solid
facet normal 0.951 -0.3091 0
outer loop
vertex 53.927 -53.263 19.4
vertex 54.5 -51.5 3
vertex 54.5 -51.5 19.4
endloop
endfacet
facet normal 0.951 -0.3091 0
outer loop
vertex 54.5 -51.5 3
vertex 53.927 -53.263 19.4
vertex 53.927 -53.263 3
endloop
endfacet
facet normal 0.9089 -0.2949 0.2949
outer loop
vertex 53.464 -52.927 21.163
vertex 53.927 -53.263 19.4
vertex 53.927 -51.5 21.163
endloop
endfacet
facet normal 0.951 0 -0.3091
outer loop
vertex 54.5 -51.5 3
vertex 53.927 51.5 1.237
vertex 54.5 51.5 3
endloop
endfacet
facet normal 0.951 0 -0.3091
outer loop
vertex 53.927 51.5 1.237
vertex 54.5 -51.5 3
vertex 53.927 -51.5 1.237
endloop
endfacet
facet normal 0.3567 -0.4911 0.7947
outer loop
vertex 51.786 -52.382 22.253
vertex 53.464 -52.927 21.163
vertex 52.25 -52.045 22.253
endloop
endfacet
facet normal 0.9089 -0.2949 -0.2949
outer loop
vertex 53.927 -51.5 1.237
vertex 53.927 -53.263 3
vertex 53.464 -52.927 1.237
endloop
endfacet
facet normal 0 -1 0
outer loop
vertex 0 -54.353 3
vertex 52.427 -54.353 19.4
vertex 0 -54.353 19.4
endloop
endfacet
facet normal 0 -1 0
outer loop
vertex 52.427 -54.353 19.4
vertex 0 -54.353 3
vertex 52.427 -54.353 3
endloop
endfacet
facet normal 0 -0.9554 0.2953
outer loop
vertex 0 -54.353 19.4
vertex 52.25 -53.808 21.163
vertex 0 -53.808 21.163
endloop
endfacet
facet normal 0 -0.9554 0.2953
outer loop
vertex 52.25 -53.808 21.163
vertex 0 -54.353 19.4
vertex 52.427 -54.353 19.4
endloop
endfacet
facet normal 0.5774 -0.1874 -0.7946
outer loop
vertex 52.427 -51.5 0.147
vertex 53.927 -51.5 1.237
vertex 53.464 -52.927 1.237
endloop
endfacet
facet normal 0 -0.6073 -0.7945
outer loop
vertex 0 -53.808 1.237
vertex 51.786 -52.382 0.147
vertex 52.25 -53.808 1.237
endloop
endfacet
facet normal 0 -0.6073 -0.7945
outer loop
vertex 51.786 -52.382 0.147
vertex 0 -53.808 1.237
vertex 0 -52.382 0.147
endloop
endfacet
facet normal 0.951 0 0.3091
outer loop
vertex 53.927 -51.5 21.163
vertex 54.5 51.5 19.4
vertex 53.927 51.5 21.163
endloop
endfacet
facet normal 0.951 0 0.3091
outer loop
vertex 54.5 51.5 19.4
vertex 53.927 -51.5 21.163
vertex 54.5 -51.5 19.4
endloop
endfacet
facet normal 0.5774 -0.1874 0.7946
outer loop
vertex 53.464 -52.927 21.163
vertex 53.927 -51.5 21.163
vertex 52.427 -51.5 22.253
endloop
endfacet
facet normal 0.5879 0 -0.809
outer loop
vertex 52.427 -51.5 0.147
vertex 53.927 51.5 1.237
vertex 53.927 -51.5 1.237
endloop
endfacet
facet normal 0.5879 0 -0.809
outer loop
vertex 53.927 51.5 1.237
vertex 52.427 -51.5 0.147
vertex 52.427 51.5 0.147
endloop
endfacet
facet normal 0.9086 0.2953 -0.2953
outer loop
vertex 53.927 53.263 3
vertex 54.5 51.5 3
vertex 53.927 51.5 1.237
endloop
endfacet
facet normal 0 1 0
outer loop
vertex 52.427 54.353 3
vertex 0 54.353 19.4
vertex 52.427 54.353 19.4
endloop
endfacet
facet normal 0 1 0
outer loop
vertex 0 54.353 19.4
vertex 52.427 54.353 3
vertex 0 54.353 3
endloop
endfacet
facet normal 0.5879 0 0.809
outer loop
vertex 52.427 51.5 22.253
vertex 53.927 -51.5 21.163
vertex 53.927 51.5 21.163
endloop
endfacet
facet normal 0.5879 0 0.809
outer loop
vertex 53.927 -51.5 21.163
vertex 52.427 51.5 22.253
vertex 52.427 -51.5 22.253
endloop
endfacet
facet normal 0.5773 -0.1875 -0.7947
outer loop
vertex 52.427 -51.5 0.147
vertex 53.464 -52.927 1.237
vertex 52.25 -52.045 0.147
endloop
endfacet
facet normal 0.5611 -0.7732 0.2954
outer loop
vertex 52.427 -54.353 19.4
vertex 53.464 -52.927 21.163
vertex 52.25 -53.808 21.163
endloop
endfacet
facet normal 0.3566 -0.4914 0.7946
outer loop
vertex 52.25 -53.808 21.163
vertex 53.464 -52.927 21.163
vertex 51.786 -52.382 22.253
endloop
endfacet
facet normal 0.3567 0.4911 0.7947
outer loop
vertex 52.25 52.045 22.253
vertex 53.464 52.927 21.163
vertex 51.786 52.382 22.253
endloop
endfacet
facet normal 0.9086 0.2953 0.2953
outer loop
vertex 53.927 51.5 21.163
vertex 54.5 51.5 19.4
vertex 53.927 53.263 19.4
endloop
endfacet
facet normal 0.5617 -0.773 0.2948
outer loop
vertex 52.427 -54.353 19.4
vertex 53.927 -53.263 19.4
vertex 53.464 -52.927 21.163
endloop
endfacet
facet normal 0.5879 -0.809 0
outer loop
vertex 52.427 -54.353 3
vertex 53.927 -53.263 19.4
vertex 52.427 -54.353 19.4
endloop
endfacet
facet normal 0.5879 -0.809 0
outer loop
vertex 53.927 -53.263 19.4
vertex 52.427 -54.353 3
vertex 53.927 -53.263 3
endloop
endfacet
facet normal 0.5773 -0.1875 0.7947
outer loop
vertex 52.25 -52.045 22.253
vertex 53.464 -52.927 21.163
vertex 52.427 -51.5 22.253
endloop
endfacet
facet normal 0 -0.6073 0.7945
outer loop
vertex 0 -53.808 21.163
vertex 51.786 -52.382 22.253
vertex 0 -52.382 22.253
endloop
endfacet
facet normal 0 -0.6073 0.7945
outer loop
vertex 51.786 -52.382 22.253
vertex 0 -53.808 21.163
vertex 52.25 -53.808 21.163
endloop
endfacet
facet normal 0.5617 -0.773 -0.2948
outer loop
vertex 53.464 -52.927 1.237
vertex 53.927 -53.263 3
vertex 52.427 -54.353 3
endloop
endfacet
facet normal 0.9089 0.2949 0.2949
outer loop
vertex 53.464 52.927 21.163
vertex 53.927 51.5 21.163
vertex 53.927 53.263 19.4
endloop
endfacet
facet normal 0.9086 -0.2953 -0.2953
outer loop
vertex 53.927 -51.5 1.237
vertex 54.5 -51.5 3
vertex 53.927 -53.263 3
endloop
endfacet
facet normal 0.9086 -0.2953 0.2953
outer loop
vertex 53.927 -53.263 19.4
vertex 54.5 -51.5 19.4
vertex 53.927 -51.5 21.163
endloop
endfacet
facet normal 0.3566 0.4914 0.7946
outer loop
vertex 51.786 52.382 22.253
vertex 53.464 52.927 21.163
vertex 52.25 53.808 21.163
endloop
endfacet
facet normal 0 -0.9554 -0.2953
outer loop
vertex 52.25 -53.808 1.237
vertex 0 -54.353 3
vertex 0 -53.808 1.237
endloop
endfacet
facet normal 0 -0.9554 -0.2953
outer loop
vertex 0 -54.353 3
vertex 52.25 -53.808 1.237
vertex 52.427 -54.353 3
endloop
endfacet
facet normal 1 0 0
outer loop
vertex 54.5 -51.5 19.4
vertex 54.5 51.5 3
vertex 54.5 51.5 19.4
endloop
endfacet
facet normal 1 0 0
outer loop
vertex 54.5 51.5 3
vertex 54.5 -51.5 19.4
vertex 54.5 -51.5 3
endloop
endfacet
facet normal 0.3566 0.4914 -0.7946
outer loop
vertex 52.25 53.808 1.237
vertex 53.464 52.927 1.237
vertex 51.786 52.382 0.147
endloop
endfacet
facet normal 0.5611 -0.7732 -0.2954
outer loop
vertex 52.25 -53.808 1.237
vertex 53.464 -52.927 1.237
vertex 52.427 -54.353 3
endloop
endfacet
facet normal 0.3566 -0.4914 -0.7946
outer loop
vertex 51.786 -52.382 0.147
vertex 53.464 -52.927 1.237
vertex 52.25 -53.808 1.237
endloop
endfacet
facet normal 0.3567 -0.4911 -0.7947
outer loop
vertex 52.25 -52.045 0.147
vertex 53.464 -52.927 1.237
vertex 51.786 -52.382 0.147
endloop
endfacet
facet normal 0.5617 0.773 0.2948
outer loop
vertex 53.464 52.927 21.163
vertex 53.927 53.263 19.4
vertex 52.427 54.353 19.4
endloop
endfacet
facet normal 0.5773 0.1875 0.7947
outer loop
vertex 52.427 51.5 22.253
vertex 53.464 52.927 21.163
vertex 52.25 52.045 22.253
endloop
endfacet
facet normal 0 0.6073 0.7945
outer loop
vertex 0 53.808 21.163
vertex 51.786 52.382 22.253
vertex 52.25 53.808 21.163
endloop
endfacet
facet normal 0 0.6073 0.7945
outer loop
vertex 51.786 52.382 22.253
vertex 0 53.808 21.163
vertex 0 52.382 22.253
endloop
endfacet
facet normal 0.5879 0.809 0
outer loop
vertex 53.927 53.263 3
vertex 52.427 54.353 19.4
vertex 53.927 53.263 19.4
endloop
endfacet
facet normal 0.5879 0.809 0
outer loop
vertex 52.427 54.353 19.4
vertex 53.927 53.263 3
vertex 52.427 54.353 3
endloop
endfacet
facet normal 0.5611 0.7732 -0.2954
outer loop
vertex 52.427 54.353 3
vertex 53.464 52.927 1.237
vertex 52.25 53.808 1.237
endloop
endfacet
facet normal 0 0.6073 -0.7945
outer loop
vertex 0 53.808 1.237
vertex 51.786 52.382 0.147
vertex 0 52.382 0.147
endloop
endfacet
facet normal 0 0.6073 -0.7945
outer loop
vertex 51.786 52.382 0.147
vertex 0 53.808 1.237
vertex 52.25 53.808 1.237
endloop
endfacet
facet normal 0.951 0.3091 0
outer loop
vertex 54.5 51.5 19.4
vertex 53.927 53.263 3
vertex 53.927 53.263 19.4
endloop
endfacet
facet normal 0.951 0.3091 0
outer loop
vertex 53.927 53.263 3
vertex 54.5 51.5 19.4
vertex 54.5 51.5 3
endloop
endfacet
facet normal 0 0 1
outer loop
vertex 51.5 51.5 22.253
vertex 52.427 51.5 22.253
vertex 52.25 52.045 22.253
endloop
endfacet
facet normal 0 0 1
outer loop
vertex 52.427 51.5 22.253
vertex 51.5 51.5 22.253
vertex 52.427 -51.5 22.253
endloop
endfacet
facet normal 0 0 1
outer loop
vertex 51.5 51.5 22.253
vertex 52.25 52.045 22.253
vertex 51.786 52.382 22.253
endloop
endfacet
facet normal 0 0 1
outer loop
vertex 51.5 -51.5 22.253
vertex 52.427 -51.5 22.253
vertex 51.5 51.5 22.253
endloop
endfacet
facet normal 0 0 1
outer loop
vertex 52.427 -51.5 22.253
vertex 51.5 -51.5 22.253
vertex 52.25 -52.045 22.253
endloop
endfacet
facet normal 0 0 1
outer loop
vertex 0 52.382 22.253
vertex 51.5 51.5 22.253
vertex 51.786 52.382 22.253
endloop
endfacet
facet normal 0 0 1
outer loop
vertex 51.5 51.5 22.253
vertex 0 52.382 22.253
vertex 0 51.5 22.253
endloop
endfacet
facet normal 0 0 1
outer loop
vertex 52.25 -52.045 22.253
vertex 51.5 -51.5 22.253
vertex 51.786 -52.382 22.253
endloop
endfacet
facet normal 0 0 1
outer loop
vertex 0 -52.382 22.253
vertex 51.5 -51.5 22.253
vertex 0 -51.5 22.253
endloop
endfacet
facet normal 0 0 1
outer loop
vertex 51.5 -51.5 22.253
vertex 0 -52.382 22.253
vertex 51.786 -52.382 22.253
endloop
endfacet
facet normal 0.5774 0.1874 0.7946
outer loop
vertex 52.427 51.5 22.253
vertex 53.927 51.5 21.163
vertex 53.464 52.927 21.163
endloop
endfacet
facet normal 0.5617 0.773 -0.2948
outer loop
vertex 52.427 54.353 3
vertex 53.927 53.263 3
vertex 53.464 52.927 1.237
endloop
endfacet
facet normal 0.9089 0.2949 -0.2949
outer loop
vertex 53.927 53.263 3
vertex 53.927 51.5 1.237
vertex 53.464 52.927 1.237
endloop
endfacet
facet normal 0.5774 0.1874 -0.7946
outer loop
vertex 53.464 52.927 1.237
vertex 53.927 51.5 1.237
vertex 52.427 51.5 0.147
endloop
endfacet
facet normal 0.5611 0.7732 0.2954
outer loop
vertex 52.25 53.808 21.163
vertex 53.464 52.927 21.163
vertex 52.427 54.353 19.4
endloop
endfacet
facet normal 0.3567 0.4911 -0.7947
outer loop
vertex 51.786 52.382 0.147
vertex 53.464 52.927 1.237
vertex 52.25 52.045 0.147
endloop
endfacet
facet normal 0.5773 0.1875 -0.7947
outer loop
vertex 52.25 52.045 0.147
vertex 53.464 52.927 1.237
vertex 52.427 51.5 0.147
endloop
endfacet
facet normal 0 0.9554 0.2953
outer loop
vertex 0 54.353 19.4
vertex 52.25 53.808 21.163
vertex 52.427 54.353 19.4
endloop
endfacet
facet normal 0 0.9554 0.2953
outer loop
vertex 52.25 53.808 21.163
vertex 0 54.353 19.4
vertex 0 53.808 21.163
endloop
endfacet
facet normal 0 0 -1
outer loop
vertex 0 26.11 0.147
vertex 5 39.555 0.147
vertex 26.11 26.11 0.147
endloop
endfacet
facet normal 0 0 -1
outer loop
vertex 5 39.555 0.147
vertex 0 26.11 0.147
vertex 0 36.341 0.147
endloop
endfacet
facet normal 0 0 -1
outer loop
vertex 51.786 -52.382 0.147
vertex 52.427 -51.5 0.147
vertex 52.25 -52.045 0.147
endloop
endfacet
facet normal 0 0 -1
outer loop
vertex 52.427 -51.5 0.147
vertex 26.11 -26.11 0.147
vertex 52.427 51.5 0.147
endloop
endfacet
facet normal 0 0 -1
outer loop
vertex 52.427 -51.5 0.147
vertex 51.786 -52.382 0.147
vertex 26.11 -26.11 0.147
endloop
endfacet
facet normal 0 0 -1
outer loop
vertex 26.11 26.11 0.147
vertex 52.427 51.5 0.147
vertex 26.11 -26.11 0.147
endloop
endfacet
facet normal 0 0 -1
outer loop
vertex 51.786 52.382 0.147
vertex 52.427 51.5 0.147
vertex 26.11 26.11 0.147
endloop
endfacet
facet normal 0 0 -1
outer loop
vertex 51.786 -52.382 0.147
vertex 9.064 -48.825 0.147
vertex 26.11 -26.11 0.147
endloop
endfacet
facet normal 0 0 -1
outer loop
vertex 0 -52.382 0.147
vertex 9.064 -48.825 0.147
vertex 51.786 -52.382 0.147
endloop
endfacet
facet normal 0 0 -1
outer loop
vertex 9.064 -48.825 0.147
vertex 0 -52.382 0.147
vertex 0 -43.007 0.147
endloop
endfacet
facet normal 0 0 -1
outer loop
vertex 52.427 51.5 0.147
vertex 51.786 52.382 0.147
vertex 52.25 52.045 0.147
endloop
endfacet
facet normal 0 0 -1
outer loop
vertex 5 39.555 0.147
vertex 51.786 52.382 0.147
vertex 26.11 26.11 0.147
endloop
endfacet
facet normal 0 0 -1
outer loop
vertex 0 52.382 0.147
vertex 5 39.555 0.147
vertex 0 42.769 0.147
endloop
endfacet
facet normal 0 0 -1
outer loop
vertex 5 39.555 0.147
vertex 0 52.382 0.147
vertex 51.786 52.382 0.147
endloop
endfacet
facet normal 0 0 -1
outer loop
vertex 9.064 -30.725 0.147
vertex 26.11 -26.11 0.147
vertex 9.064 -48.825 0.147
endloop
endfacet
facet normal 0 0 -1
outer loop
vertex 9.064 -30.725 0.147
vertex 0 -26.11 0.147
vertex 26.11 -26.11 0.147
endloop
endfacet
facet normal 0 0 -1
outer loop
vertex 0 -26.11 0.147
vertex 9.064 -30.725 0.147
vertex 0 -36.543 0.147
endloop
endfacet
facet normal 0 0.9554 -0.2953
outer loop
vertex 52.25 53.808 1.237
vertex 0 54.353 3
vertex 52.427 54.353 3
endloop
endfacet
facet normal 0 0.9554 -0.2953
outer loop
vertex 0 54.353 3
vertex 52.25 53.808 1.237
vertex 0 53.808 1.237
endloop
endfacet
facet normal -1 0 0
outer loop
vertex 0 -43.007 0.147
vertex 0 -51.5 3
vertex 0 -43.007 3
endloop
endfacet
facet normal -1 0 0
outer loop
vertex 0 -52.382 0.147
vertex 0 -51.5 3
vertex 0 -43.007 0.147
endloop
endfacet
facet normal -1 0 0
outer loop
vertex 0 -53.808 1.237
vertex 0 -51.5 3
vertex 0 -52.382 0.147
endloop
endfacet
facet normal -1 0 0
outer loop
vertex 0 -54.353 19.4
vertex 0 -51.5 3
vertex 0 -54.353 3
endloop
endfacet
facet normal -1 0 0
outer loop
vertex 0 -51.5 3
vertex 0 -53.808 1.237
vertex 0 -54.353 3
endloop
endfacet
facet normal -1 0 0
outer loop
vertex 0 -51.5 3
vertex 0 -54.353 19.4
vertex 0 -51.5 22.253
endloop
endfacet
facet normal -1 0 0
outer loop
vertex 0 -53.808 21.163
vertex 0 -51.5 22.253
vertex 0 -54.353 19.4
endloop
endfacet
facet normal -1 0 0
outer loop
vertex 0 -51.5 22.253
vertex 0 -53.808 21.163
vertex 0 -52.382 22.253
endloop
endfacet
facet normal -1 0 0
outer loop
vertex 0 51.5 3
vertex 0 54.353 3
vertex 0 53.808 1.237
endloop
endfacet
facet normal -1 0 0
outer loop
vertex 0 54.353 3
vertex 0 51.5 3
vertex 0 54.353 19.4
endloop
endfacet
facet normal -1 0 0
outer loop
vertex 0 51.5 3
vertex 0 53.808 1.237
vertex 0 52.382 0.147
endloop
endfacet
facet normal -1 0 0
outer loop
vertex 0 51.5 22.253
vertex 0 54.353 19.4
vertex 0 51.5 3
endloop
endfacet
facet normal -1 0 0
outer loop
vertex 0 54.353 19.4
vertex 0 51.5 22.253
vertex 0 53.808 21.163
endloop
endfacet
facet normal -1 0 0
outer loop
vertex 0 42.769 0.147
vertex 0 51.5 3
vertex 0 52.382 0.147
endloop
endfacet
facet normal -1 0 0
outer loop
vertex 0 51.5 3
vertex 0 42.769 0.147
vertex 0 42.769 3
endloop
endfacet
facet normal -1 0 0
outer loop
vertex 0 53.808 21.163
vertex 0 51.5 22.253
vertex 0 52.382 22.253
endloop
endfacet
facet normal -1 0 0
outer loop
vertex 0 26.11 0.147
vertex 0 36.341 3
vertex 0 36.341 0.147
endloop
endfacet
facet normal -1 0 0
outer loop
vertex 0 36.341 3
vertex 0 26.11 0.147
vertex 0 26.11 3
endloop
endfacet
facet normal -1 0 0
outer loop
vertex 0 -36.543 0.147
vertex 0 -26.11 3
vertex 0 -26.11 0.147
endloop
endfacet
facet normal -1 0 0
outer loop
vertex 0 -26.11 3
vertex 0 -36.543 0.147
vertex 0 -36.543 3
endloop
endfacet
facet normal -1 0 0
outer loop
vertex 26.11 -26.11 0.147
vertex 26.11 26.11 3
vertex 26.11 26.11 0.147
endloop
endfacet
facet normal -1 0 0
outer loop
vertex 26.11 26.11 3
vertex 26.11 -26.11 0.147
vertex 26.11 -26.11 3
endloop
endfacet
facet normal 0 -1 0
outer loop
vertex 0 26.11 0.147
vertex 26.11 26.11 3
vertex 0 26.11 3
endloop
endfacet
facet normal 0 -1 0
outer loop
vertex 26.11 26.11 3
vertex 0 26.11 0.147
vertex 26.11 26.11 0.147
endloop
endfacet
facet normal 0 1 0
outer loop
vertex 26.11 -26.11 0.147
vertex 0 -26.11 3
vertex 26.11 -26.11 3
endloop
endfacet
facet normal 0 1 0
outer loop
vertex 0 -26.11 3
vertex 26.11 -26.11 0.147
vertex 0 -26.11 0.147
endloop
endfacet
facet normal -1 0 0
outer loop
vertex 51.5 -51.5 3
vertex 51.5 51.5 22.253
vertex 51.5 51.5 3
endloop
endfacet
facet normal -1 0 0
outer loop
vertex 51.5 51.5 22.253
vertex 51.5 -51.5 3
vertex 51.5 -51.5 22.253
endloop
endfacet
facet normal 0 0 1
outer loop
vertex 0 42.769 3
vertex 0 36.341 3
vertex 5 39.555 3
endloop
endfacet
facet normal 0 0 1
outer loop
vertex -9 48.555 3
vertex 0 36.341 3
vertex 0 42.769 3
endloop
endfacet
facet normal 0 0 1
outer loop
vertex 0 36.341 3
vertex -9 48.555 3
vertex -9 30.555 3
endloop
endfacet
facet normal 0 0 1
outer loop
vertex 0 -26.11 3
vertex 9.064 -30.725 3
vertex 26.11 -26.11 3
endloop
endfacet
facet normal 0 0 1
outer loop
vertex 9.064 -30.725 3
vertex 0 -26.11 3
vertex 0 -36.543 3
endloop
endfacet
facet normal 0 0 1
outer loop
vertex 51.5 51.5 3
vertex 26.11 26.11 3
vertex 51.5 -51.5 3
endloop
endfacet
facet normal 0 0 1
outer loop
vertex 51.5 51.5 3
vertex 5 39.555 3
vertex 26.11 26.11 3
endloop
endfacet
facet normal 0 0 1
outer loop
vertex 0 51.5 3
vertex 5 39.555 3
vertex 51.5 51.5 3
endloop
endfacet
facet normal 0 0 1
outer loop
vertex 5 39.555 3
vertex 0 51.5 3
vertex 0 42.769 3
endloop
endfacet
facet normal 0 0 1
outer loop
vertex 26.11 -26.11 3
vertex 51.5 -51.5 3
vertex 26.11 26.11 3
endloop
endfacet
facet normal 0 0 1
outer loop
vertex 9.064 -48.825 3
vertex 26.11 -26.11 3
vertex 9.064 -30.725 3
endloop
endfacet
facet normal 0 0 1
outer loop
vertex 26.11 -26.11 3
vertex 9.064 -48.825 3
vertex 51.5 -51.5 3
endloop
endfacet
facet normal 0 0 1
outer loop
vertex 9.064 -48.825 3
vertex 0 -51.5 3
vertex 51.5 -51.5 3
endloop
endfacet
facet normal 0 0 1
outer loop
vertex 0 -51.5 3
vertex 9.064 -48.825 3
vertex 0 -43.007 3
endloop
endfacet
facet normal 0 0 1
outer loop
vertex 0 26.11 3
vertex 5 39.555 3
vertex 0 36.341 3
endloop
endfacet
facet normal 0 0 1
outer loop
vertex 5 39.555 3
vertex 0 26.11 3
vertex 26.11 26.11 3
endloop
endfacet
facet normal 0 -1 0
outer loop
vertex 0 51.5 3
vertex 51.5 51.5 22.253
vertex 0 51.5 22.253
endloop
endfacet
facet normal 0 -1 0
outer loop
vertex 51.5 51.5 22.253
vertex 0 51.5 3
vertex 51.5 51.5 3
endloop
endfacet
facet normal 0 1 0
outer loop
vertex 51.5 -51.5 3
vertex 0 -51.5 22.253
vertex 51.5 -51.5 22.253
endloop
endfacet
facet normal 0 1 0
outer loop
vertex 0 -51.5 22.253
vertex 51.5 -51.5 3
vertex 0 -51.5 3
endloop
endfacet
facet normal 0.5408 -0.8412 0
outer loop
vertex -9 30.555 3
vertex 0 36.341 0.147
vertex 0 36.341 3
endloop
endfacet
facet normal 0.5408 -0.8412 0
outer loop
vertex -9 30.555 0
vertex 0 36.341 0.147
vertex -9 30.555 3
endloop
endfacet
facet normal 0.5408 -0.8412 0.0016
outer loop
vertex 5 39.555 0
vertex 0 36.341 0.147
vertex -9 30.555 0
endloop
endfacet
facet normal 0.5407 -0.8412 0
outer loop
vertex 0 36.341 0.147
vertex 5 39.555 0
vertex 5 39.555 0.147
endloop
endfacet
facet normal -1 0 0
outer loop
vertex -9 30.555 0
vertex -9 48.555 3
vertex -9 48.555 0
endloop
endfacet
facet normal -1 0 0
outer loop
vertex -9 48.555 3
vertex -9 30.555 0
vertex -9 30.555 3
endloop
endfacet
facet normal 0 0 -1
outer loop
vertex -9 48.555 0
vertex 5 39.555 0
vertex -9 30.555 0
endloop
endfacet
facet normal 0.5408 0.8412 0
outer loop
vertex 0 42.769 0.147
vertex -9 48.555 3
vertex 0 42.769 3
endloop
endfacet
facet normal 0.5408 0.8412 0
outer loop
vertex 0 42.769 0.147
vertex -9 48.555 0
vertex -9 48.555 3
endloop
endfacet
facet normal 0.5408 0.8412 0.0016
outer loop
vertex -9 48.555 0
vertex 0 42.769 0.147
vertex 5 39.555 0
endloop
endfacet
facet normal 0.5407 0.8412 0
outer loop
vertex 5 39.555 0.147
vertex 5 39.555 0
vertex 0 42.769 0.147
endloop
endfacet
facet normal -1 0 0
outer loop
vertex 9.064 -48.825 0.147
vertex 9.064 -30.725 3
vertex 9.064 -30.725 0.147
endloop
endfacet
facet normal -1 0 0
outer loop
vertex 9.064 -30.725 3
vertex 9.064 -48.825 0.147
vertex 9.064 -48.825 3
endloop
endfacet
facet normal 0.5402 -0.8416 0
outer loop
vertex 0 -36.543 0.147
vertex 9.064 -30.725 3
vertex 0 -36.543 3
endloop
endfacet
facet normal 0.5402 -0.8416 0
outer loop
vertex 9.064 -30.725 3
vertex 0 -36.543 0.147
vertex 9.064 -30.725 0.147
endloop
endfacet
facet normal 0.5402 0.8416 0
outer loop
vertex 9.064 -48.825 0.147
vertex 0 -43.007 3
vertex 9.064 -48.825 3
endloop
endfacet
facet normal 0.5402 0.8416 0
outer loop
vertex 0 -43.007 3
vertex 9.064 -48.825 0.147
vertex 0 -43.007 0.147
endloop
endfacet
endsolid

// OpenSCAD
// This is a complete rewrite.  This time, going for rounded edges!
// This may not be right!  Does the minkowki make it bigger by 2*minkValue(), or 1x?
// My measurements are in mm
minkValue=3;
Outer=109-minkValue;
Height=22.4-minkValue;
CenterSquare=52.22;
CenterSquareHeight=Height+0.2; //slightly taller
WallThickness=3.0;
InternalVoid=Outer-WallThickness;
InternalVoidHeight=Height-WallThickness;

module outerShell(){
    difference() {
        minkowski() {
            linear_extrude(height=Height-(minkValue)) 
            square([(Outer-(minkValue)),Outer-(minkValue)], center=true);
            sphere(minkValue);
        };
        translate([Outer/2,0,-minkValue])
        linear_extrude(height=Height+minkValue) 
        square([Outer,Outer+minkValue], center=true);
    }
}
module centerPost() {
                // Post, centered
                linear_extrude(height=CenterSquareHeight)
                square(CenterSquare, center=true);
}
module innerHollow() {
                // The inside is hollow
    translate([0,0,-minkValue])
            linear_extrude(height=InternalVoidHeight+minkValue)
                square(InternalVoid, center=true);
}
// This is just a triangular prism
// I'm going by feel, on this one!
// It would fit in a rectangle with these dimensions:
dogEarX=14; // These values should be calculated from Outer (?)
dogEarY=18;
dogEarYPos=((CenterSquare/2 + (Outer/2-CenterSquare/2)/2)); // Center of arm
module dogEar() {
    linear_extrude(height=WallThickness) 
    polygon([[0,0], [dogEarX,-(dogEarY/2)], [dogEarX,(dogEarY/2)]]);
}
clearance=0.1; // a "fudge-factor" for 3D printing, letting parts fit
dogEarStrength=5; // how deep to bury the dogEars
rotate([0,180,0]) translate([0,0,-(Height)])
    difference() {
        union() {
            difference() {
                difference() {
                    outerShell();
                    centerPost();
                }
                innerHollow();
            }      
            translate([-dogEarStrength, dogEarYPos, (Height-WallThickness)])
            dogEar(); // add the dogEar, in the right place
        }   
        resize([(dogEarX+clearance),(dogEarY+clearance)])
        translate([dogEarStrength, -dogEarYPos, (Height-WallThickness)])
        rotate([0,0,180])    
        dogEar();  // subtract the dogEar, in the right place, bigger!
    }
